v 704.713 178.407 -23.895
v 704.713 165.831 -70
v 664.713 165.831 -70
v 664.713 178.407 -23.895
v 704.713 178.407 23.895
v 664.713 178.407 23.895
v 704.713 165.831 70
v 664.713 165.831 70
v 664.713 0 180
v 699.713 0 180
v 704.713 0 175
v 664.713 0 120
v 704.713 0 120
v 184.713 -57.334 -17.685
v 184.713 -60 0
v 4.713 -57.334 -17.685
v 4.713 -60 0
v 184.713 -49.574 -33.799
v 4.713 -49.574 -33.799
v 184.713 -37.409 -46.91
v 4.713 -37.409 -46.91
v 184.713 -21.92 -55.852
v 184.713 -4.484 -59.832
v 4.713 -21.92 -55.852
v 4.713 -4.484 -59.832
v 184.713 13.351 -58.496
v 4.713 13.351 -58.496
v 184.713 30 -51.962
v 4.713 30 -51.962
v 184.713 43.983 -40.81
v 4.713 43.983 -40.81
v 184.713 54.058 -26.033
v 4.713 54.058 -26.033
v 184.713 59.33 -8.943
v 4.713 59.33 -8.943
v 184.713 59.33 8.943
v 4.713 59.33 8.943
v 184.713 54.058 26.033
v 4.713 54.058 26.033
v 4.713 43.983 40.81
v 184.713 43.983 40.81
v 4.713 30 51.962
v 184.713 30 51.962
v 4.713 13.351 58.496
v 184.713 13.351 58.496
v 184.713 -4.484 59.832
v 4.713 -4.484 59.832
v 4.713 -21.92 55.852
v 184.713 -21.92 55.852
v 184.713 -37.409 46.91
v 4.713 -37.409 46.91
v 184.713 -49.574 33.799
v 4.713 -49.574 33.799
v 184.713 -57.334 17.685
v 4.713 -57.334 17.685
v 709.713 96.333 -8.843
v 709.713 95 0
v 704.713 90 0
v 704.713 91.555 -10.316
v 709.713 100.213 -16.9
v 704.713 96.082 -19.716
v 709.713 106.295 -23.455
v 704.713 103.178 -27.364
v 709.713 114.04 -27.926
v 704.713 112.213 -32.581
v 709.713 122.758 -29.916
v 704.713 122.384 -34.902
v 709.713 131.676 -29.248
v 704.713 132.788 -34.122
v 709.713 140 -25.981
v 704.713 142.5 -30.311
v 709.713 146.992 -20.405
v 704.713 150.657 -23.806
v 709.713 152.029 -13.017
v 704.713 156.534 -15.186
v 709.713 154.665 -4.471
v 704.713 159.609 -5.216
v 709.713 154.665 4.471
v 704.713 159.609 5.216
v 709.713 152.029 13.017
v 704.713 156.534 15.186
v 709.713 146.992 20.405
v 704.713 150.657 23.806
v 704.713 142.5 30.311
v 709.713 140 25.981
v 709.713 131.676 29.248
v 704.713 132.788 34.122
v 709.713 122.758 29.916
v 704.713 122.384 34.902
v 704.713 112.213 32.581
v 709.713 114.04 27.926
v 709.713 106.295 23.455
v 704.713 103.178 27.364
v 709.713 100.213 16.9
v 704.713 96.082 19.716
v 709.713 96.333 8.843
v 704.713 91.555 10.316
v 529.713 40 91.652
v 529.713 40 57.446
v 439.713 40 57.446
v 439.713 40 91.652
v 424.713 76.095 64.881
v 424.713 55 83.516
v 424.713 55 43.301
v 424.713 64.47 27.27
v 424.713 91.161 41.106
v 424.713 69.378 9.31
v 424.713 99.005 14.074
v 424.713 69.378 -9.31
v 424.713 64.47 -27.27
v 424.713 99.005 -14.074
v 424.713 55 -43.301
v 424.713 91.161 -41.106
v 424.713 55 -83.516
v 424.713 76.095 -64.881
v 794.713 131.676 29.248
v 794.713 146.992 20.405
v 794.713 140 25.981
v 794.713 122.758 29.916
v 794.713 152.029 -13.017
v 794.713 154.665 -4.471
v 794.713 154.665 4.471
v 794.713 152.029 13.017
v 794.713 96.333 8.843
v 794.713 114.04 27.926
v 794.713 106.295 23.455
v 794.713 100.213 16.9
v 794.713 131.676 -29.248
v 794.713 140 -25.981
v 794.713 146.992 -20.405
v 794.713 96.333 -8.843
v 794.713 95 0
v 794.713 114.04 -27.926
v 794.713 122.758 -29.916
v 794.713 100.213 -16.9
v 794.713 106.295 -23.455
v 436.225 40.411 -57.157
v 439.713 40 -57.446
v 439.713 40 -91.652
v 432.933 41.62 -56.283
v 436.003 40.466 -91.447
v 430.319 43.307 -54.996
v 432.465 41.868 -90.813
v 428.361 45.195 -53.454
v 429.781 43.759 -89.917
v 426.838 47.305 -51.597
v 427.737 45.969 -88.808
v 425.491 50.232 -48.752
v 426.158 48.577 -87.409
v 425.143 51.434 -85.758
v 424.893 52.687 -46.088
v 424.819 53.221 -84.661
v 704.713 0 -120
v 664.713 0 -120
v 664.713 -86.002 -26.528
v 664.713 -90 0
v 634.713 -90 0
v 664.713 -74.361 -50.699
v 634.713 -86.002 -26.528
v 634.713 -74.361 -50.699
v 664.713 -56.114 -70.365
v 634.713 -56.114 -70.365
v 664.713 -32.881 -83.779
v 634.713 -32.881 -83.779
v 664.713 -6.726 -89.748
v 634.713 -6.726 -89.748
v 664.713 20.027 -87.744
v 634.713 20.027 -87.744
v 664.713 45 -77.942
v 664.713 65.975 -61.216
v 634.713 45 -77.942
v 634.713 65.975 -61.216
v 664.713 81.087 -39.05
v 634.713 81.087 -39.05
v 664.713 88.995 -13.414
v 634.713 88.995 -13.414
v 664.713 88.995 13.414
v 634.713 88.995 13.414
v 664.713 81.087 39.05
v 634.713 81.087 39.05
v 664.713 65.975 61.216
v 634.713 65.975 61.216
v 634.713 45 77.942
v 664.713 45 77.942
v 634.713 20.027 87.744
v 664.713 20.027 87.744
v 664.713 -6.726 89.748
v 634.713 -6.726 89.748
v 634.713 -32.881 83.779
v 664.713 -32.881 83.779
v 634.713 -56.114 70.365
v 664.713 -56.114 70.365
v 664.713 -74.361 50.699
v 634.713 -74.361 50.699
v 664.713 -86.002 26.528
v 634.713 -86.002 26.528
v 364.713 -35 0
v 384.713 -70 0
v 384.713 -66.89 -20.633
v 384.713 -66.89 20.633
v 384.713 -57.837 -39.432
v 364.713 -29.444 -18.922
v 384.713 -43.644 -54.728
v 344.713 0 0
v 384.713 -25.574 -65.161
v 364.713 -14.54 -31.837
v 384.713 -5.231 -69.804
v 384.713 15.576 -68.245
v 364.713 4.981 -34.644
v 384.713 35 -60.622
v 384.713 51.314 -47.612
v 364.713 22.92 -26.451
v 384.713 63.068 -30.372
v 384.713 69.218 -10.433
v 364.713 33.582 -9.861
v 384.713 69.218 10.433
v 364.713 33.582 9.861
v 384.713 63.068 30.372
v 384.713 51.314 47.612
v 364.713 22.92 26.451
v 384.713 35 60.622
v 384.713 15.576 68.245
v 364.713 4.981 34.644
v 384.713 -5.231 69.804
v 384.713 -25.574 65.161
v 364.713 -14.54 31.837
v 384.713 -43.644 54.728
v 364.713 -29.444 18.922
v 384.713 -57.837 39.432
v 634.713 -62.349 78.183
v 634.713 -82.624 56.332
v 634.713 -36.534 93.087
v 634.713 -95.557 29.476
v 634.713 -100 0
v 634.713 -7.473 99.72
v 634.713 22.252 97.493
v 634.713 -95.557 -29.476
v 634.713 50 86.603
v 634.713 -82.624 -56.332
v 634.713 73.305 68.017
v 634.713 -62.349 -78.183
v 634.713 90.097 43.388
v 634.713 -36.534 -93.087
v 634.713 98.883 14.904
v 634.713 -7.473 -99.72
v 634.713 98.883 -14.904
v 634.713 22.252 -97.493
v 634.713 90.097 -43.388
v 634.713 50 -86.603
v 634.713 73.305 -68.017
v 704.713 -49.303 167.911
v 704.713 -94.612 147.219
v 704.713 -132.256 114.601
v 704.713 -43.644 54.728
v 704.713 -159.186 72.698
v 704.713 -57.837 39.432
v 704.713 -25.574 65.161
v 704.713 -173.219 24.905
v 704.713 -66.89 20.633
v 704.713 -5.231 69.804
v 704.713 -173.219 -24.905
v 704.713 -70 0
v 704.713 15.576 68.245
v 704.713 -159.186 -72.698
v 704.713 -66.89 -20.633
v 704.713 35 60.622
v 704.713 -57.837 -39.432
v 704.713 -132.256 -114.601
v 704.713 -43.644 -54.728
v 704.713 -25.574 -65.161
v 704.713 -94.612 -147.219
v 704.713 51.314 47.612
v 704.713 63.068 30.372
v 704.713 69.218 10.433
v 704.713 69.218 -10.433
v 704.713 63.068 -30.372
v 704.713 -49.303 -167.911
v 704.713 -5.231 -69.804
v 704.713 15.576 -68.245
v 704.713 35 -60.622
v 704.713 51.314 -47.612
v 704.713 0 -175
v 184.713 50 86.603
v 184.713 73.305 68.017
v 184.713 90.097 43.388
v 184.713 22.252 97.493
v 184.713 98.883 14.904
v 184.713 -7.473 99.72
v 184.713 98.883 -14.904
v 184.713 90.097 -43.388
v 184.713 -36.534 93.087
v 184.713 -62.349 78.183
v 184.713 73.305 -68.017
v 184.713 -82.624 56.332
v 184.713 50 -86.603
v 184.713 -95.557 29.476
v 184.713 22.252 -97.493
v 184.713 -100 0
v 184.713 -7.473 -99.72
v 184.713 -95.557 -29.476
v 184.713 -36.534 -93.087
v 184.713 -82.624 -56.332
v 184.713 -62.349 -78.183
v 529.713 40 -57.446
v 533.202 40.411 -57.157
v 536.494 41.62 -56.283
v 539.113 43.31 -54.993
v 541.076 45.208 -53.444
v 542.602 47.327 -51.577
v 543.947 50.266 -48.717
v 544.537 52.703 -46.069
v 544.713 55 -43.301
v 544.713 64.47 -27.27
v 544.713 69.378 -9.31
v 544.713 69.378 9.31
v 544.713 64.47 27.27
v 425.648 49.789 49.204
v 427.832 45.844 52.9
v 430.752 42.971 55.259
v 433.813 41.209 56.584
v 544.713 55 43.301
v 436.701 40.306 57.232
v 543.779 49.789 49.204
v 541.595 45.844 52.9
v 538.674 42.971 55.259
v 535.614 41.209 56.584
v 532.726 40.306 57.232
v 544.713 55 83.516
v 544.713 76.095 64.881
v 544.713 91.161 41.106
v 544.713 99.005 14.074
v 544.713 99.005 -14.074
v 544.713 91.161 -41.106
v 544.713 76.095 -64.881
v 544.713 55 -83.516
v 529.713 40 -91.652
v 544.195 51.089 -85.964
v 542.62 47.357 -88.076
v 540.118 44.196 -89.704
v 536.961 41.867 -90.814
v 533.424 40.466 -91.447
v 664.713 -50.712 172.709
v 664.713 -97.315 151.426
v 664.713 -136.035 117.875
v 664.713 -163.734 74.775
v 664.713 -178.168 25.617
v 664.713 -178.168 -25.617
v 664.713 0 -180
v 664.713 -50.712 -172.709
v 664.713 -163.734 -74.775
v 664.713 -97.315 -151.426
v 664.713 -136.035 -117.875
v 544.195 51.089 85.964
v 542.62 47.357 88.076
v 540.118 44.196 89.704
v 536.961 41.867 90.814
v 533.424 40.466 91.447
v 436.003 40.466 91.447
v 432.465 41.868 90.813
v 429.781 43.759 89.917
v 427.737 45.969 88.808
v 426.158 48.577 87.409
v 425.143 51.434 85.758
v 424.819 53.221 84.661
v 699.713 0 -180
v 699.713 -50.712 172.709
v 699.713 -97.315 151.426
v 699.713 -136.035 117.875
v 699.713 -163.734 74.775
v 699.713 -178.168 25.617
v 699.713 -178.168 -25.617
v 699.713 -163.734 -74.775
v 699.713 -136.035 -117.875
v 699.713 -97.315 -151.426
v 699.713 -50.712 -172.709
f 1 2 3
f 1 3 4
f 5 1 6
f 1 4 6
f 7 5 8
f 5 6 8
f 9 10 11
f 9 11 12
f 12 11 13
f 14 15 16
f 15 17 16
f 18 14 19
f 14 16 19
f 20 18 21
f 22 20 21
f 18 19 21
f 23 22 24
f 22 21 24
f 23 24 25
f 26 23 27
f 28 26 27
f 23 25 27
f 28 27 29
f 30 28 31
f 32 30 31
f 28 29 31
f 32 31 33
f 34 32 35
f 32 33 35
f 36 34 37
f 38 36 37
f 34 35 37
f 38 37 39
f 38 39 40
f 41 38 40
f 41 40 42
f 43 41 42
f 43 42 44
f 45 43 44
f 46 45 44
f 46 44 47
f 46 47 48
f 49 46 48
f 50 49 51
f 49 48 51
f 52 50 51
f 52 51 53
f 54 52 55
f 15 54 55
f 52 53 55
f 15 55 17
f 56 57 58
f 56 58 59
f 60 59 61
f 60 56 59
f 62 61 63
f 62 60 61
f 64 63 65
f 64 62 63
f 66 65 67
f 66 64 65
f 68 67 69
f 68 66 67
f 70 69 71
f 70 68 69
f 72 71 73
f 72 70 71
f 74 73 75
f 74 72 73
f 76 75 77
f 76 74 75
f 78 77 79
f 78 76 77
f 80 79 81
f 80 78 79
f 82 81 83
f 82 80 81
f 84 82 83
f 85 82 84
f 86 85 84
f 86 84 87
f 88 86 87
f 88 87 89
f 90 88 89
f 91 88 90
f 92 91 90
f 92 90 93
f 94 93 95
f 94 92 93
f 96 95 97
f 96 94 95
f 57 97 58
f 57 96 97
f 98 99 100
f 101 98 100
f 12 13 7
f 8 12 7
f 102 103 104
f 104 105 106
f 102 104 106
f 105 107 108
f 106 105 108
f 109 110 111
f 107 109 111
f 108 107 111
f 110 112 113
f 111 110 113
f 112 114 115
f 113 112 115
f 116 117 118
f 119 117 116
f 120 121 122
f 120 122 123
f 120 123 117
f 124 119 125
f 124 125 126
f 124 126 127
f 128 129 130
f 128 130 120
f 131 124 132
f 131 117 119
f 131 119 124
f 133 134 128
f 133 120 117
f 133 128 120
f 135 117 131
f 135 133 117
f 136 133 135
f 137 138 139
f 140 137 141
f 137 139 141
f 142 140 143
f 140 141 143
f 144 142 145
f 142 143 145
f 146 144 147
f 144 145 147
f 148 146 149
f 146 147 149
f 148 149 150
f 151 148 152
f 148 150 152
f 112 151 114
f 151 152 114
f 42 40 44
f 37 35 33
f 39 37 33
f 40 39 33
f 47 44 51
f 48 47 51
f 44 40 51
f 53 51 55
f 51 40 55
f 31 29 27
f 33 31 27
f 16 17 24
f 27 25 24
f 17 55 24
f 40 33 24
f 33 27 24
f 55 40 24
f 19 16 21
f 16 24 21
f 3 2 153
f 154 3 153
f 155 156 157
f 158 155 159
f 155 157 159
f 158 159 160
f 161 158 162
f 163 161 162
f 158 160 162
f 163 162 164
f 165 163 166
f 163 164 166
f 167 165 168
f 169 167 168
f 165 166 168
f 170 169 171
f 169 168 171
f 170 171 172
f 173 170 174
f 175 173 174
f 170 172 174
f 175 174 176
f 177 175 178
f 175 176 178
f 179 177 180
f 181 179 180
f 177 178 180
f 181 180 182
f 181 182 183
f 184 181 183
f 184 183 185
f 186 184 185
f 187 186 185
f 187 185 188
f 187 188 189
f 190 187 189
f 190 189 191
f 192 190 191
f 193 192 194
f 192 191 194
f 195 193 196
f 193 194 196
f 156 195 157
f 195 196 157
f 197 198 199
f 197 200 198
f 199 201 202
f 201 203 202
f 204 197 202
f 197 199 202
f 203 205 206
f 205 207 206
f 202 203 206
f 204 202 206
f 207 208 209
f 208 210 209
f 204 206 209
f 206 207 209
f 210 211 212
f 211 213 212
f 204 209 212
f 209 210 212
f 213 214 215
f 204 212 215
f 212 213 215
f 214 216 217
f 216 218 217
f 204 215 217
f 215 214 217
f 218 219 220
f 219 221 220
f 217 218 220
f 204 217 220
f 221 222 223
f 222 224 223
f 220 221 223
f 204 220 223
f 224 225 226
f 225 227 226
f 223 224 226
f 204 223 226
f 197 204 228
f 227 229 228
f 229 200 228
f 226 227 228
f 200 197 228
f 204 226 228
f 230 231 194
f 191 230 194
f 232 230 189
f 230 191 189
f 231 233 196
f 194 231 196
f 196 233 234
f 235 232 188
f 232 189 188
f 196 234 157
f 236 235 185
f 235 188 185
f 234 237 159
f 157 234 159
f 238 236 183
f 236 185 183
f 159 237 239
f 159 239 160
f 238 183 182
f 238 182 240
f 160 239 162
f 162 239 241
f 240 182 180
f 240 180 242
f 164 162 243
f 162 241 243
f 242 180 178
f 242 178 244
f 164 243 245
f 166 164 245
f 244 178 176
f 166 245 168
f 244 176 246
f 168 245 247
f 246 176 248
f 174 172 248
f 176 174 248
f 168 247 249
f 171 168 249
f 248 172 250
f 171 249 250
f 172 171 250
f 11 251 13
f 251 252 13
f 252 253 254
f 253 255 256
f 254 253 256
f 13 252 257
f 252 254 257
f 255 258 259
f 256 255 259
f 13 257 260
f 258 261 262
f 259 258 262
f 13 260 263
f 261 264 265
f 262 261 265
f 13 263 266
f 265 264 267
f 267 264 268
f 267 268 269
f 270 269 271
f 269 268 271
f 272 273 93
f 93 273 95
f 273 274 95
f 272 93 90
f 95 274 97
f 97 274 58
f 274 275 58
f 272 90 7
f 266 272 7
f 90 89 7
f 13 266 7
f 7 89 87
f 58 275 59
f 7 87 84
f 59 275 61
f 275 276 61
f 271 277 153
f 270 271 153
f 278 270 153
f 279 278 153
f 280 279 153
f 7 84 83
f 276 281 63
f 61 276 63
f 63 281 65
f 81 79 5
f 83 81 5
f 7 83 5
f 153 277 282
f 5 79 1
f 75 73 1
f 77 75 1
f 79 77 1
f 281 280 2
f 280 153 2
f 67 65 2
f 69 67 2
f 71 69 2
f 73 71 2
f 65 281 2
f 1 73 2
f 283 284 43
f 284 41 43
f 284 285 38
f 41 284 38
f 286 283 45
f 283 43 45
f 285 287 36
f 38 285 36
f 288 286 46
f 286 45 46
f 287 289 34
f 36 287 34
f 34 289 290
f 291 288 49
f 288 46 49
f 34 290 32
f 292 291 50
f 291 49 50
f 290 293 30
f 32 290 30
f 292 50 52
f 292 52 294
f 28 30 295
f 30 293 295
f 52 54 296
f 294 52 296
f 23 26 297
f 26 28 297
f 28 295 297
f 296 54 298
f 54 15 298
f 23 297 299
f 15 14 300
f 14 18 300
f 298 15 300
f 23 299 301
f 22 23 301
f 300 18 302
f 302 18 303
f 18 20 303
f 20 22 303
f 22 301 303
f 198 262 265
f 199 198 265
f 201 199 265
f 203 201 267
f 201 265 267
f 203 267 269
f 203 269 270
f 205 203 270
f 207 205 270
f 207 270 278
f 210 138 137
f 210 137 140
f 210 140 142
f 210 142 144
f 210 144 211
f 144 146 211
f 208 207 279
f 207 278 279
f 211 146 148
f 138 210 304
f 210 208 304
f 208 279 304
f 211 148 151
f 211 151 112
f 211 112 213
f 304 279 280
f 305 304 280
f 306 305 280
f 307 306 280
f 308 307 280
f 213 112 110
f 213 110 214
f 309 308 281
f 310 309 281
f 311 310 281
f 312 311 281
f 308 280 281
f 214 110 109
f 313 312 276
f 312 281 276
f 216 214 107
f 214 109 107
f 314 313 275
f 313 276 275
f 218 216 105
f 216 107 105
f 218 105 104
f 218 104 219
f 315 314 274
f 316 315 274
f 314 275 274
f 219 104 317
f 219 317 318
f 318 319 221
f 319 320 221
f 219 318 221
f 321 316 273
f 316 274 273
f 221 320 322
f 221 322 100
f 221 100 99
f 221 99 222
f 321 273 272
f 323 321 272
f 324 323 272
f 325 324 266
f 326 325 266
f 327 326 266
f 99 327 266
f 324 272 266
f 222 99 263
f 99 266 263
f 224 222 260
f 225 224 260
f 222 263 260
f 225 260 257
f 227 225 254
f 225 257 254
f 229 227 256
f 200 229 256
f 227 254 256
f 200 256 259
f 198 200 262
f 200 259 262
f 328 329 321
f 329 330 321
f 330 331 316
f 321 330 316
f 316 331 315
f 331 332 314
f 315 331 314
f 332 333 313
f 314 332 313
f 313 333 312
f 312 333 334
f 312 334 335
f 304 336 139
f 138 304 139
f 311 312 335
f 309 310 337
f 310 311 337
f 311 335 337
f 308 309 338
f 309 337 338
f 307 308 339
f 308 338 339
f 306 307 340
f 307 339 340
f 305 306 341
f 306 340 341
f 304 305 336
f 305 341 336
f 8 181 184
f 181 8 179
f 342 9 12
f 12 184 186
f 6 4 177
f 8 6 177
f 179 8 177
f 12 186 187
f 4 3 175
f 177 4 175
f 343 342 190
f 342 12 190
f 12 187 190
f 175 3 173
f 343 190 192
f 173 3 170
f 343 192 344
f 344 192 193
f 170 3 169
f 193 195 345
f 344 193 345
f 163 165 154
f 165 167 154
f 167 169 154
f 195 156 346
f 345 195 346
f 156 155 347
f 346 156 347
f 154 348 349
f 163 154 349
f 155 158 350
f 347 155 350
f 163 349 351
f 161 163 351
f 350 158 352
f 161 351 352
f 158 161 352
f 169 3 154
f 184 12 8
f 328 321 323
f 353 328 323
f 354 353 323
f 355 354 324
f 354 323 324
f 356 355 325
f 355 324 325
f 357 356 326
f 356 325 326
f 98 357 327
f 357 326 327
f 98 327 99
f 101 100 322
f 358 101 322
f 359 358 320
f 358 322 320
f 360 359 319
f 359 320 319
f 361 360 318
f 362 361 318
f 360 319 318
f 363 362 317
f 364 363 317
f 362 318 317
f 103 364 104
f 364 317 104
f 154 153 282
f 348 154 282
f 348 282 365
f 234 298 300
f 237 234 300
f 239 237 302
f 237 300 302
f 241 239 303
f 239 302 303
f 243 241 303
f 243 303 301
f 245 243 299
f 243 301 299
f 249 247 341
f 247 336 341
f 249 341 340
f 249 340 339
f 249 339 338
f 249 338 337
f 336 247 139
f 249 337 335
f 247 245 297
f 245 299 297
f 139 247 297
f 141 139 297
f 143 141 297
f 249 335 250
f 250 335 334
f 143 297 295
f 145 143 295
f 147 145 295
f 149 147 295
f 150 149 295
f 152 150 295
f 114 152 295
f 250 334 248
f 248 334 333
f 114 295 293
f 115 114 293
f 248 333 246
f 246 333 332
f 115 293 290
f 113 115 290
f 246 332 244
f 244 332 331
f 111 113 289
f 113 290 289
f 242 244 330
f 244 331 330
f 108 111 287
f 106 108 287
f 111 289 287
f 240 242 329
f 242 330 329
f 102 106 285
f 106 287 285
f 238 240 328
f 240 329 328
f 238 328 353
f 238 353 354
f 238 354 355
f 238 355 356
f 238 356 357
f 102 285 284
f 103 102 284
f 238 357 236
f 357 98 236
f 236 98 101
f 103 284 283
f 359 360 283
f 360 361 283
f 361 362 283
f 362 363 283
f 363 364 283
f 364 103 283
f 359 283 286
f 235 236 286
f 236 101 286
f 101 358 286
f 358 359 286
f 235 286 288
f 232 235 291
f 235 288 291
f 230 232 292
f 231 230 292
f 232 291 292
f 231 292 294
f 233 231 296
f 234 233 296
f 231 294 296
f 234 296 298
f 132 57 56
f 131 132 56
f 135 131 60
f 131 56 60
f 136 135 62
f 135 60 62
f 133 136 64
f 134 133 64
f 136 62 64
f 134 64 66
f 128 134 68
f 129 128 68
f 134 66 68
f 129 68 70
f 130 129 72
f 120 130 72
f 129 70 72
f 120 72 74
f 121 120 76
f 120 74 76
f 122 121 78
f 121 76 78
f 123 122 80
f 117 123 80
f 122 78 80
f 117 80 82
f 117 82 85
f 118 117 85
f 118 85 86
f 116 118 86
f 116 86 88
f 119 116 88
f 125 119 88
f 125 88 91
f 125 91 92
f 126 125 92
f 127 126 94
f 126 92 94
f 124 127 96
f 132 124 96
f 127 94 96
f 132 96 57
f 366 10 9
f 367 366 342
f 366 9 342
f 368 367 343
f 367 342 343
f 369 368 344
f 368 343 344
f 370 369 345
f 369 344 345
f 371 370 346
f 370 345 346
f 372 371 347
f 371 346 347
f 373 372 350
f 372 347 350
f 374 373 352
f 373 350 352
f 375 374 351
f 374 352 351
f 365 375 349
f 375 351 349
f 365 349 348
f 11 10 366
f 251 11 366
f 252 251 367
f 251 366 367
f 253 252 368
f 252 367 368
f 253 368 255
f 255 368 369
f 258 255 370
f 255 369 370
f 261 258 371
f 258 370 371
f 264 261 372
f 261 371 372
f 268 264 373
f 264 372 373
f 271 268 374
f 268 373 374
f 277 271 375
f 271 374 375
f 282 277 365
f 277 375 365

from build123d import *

# Parameters (mm, degrees)
ENL_V_MAT_EXTRU_1_DEPTH      = 750.28036314
ENL_V_MAT_EXTRU_1_DEPTH_BACK = 750.28036314
ENL_V_MAT_EXTRU_2_DEPTH      = 745.848977981
ESQUISSE5_R                  = 30
BOSS_EXTRU_1_DEPTH           = 90
CHANFREIN2_SIZE              = 5


with BuildPart() as part:
    # Esquisse1 → Révolution1 (revolve)
    with BuildSketch(Plane.XY, mode=Mode.PRIVATE) as r_volution1_sk:
        Polygon((4.713461336, 0), (344.713461336, 0), (384.713461336, 70), (704.713461336, 70), (704.713461336, 180), (664.713461336, 180), (664.713461336, 90), (634.713461336, 90), (634.713461336, 100), (184.713461336, 100), (184.713461336, 60), (4.713461336, 60), align=None)
    revolve(r_volution1_sk.sketch.rotate(Axis((4.713461336, 0, 0), (1, 0, 0)), 180), axis=Axis((4.713461336, 0, 0), (1, 0, 0)))

    # Esquisse2 → Enlèv. mat.-Extru.1 (cut, two sides: drawn at the far end of the back side and taken through both)
    with BuildSketch(Plane.XY.offset(-ENL_V_MAT_EXTRU_1_DEPTH_BACK)):
        with BuildLine():
            Line((424.713461336, 100), (544.713461336, 100))
            Line((544.713461336, 100), (544.713461336, 55))
            ThreePointArc((544.713461336, 55), (540.320063053, 44.393398282), (529.713461336, 40))
            Line((529.713461336, 40), (439.713461336, 40))
            ThreePointArc((439.713461336, 40), (429.106859618, 44.393398282), (424.713461336, 55))
            Line((424.713461336, 55), (424.713461336, 100))
        make_face()
    extrude(amount=ENL_V_MAT_EXTRU_1_DEPTH + ENL_V_MAT_EXTRU_1_DEPTH_BACK, mode=Mode.SUBTRACT)

    # Esquisse4 → Enlèv. mat.-Extru.2 (cut, through all)
    with BuildSketch(Plane(origin=(704.713461336, 0, 0), x_dir=(0, 0, -1), z_dir=(1, 0, 0))):
        with BuildLine():
            Line((-120, 0), (-70, 165.831239518))
            ThreePointArc((-70, 165.831239518), (-150, 99.498743711), (-180, 0))
            Line((-180, 0), (-120, 0))
        make_face()
        with BuildLine():
            ThreePointArc((180, 0), (150, 99.498743711), (70, 165.831239518))
            Line((70, 165.831239518), (120, 0))
            Line((120, 0), (180, 0))
        make_face()
    extrude(amount=-ENL_V_MAT_EXTRU_2_DEPTH, mode=Mode.SUBTRACT)

    # Esquisse5 → Boss.-Extru.1 (add)
    with BuildSketch(Plane(origin=(704.713461336, 0, 0), x_dir=(0, 0, -1), z_dir=(1, 0, 0))):
        with Locations(Location((0, 125, 0), (0, 0, 270))):
            Circle(ESQUISSE5_R)
    extrude(amount=BOSS_EXTRU_1_DEPTH)

    # Chanfrein2
    chanfrein2_edges = [part.edges().sort_by_distance(p)[0] for p in [
        (704.713461336, 155, 0),
        (704.713461336, -180, 0),
    ]]
    chamfer(chanfrein2_edges, length=CHANFREIN2_SIZE)


solid = part.part
